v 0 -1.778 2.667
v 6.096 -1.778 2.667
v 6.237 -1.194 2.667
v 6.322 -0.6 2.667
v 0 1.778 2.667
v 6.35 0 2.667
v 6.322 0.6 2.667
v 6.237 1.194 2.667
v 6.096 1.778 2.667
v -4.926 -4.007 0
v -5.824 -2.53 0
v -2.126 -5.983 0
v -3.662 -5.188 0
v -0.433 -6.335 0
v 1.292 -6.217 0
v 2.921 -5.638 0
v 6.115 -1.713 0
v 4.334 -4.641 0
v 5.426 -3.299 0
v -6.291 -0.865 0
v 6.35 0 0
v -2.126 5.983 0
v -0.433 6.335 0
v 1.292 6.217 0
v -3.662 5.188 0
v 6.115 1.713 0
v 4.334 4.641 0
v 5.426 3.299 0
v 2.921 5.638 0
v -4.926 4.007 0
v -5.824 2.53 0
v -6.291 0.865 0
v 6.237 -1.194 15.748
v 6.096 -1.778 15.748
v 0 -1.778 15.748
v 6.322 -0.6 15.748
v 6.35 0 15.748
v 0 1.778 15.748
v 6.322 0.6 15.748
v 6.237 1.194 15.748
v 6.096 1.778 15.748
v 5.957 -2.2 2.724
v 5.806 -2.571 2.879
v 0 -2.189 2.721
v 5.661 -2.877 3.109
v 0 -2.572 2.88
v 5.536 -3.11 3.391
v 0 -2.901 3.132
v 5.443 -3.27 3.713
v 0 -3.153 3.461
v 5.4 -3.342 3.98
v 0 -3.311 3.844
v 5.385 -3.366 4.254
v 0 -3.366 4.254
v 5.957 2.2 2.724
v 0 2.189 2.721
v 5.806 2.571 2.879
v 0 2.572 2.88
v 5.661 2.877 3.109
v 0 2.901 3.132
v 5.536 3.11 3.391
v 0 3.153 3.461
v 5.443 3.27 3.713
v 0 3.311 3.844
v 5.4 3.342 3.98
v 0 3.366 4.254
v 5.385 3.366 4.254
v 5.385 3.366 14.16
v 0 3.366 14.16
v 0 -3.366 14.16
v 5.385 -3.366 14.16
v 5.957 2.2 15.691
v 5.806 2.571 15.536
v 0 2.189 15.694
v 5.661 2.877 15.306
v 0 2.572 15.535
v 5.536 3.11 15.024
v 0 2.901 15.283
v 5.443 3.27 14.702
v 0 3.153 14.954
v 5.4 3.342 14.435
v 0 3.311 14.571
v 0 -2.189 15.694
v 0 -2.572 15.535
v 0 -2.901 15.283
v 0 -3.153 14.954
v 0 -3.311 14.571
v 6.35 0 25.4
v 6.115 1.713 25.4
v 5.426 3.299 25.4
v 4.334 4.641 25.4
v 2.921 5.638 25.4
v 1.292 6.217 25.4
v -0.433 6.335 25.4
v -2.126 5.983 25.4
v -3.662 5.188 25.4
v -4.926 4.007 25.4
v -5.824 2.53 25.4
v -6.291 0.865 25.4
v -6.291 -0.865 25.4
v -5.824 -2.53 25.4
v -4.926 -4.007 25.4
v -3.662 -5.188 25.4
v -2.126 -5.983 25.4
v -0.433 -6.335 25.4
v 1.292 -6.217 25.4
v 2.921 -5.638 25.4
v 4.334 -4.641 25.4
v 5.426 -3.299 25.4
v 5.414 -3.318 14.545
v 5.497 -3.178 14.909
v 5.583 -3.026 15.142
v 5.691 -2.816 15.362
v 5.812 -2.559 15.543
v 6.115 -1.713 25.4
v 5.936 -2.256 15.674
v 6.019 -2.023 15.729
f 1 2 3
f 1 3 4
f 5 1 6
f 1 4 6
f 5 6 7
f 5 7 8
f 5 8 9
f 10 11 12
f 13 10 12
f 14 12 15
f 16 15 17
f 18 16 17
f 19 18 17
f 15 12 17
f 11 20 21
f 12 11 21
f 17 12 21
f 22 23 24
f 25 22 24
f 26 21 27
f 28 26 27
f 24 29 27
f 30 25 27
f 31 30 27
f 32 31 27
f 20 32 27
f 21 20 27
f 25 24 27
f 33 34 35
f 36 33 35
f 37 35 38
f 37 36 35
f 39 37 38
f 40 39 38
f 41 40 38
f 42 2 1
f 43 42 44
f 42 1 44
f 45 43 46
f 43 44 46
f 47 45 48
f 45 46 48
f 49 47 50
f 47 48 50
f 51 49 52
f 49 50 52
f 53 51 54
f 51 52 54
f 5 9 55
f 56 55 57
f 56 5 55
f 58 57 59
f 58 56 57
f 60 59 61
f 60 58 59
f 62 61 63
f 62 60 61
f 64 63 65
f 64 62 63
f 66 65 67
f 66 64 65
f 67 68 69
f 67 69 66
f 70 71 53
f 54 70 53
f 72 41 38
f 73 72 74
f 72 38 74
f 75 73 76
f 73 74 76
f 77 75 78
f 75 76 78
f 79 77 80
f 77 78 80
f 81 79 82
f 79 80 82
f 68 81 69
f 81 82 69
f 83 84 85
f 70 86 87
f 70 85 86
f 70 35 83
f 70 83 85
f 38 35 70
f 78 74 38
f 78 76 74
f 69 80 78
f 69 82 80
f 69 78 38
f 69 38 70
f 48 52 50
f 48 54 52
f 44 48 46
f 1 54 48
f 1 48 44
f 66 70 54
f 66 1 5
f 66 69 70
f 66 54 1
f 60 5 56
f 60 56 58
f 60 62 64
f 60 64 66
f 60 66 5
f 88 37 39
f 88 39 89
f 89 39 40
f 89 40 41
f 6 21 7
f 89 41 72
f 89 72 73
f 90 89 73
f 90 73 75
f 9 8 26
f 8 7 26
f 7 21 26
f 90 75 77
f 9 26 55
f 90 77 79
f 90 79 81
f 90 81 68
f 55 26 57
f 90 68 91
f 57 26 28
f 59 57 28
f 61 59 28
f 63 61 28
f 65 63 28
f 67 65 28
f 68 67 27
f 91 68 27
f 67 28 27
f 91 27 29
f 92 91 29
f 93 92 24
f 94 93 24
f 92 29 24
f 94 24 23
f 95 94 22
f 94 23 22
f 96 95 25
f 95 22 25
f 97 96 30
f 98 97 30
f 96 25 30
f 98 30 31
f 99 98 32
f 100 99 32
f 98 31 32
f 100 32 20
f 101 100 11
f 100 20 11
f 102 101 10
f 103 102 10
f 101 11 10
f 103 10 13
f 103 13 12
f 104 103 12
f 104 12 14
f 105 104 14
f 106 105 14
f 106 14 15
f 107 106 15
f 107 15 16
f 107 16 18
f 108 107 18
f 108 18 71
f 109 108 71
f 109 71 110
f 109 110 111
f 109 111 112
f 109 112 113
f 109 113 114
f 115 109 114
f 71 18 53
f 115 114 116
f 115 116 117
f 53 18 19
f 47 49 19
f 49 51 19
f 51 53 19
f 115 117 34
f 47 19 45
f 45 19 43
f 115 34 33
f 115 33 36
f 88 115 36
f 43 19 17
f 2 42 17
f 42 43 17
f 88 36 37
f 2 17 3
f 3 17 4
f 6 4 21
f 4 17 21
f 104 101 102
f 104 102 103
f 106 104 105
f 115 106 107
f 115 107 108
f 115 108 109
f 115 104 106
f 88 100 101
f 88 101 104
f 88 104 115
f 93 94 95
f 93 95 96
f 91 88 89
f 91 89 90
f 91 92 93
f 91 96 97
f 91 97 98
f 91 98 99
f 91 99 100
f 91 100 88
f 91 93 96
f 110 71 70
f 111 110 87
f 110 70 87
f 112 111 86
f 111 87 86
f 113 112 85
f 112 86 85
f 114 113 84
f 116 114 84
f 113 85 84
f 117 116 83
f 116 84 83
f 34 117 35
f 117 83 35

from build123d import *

# Parameters (mm, degrees)
SKETCH1_R           = 6.35
BOSS_EXTRUDE1_DEPTH = 25.4
SKETCH4_W           = 13.081
SKETCH4_H           = 6.731
CUT_EXTRUDE1_DEPTH  = 6.35
FILLET1_R           = 1.5875


with BuildPart() as part:
    # Sketch1 → Boss-Extrude1 (new body)
    with BuildSketch(Plane.XY):
        Circle(SKETCH1_R)
    extrude(amount=BOSS_EXTRUDE1_DEPTH)

    # Sketch4 → Cut-Extrude1 (cut)
    with BuildSketch(Plane(origin=(6.35, 0, 0), x_dir=(0, 0, -1), z_dir=(1, 0, 0))):
        with Locations((-9.2075, 0)):
            Rectangle(SKETCH4_W, SKETCH4_H)
    extrude(amount=-CUT_EXTRUDE1_DEPTH, mode=Mode.SUBTRACT)

    # Fillet1
    fillet1_edges = [part.edges().sort_by_distance(p)[0] for p in [
        (2.692392512, -3.3655, 15.748),
        (2.692392512, 3.3655, 15.748),
        (2.692392512, 3.3655, 2.667),
        (2.692392512, -3.3655, 2.667),
    ]]
    fillet(fillet1_edges, radius=FILLET1_R)


solid = part.part
